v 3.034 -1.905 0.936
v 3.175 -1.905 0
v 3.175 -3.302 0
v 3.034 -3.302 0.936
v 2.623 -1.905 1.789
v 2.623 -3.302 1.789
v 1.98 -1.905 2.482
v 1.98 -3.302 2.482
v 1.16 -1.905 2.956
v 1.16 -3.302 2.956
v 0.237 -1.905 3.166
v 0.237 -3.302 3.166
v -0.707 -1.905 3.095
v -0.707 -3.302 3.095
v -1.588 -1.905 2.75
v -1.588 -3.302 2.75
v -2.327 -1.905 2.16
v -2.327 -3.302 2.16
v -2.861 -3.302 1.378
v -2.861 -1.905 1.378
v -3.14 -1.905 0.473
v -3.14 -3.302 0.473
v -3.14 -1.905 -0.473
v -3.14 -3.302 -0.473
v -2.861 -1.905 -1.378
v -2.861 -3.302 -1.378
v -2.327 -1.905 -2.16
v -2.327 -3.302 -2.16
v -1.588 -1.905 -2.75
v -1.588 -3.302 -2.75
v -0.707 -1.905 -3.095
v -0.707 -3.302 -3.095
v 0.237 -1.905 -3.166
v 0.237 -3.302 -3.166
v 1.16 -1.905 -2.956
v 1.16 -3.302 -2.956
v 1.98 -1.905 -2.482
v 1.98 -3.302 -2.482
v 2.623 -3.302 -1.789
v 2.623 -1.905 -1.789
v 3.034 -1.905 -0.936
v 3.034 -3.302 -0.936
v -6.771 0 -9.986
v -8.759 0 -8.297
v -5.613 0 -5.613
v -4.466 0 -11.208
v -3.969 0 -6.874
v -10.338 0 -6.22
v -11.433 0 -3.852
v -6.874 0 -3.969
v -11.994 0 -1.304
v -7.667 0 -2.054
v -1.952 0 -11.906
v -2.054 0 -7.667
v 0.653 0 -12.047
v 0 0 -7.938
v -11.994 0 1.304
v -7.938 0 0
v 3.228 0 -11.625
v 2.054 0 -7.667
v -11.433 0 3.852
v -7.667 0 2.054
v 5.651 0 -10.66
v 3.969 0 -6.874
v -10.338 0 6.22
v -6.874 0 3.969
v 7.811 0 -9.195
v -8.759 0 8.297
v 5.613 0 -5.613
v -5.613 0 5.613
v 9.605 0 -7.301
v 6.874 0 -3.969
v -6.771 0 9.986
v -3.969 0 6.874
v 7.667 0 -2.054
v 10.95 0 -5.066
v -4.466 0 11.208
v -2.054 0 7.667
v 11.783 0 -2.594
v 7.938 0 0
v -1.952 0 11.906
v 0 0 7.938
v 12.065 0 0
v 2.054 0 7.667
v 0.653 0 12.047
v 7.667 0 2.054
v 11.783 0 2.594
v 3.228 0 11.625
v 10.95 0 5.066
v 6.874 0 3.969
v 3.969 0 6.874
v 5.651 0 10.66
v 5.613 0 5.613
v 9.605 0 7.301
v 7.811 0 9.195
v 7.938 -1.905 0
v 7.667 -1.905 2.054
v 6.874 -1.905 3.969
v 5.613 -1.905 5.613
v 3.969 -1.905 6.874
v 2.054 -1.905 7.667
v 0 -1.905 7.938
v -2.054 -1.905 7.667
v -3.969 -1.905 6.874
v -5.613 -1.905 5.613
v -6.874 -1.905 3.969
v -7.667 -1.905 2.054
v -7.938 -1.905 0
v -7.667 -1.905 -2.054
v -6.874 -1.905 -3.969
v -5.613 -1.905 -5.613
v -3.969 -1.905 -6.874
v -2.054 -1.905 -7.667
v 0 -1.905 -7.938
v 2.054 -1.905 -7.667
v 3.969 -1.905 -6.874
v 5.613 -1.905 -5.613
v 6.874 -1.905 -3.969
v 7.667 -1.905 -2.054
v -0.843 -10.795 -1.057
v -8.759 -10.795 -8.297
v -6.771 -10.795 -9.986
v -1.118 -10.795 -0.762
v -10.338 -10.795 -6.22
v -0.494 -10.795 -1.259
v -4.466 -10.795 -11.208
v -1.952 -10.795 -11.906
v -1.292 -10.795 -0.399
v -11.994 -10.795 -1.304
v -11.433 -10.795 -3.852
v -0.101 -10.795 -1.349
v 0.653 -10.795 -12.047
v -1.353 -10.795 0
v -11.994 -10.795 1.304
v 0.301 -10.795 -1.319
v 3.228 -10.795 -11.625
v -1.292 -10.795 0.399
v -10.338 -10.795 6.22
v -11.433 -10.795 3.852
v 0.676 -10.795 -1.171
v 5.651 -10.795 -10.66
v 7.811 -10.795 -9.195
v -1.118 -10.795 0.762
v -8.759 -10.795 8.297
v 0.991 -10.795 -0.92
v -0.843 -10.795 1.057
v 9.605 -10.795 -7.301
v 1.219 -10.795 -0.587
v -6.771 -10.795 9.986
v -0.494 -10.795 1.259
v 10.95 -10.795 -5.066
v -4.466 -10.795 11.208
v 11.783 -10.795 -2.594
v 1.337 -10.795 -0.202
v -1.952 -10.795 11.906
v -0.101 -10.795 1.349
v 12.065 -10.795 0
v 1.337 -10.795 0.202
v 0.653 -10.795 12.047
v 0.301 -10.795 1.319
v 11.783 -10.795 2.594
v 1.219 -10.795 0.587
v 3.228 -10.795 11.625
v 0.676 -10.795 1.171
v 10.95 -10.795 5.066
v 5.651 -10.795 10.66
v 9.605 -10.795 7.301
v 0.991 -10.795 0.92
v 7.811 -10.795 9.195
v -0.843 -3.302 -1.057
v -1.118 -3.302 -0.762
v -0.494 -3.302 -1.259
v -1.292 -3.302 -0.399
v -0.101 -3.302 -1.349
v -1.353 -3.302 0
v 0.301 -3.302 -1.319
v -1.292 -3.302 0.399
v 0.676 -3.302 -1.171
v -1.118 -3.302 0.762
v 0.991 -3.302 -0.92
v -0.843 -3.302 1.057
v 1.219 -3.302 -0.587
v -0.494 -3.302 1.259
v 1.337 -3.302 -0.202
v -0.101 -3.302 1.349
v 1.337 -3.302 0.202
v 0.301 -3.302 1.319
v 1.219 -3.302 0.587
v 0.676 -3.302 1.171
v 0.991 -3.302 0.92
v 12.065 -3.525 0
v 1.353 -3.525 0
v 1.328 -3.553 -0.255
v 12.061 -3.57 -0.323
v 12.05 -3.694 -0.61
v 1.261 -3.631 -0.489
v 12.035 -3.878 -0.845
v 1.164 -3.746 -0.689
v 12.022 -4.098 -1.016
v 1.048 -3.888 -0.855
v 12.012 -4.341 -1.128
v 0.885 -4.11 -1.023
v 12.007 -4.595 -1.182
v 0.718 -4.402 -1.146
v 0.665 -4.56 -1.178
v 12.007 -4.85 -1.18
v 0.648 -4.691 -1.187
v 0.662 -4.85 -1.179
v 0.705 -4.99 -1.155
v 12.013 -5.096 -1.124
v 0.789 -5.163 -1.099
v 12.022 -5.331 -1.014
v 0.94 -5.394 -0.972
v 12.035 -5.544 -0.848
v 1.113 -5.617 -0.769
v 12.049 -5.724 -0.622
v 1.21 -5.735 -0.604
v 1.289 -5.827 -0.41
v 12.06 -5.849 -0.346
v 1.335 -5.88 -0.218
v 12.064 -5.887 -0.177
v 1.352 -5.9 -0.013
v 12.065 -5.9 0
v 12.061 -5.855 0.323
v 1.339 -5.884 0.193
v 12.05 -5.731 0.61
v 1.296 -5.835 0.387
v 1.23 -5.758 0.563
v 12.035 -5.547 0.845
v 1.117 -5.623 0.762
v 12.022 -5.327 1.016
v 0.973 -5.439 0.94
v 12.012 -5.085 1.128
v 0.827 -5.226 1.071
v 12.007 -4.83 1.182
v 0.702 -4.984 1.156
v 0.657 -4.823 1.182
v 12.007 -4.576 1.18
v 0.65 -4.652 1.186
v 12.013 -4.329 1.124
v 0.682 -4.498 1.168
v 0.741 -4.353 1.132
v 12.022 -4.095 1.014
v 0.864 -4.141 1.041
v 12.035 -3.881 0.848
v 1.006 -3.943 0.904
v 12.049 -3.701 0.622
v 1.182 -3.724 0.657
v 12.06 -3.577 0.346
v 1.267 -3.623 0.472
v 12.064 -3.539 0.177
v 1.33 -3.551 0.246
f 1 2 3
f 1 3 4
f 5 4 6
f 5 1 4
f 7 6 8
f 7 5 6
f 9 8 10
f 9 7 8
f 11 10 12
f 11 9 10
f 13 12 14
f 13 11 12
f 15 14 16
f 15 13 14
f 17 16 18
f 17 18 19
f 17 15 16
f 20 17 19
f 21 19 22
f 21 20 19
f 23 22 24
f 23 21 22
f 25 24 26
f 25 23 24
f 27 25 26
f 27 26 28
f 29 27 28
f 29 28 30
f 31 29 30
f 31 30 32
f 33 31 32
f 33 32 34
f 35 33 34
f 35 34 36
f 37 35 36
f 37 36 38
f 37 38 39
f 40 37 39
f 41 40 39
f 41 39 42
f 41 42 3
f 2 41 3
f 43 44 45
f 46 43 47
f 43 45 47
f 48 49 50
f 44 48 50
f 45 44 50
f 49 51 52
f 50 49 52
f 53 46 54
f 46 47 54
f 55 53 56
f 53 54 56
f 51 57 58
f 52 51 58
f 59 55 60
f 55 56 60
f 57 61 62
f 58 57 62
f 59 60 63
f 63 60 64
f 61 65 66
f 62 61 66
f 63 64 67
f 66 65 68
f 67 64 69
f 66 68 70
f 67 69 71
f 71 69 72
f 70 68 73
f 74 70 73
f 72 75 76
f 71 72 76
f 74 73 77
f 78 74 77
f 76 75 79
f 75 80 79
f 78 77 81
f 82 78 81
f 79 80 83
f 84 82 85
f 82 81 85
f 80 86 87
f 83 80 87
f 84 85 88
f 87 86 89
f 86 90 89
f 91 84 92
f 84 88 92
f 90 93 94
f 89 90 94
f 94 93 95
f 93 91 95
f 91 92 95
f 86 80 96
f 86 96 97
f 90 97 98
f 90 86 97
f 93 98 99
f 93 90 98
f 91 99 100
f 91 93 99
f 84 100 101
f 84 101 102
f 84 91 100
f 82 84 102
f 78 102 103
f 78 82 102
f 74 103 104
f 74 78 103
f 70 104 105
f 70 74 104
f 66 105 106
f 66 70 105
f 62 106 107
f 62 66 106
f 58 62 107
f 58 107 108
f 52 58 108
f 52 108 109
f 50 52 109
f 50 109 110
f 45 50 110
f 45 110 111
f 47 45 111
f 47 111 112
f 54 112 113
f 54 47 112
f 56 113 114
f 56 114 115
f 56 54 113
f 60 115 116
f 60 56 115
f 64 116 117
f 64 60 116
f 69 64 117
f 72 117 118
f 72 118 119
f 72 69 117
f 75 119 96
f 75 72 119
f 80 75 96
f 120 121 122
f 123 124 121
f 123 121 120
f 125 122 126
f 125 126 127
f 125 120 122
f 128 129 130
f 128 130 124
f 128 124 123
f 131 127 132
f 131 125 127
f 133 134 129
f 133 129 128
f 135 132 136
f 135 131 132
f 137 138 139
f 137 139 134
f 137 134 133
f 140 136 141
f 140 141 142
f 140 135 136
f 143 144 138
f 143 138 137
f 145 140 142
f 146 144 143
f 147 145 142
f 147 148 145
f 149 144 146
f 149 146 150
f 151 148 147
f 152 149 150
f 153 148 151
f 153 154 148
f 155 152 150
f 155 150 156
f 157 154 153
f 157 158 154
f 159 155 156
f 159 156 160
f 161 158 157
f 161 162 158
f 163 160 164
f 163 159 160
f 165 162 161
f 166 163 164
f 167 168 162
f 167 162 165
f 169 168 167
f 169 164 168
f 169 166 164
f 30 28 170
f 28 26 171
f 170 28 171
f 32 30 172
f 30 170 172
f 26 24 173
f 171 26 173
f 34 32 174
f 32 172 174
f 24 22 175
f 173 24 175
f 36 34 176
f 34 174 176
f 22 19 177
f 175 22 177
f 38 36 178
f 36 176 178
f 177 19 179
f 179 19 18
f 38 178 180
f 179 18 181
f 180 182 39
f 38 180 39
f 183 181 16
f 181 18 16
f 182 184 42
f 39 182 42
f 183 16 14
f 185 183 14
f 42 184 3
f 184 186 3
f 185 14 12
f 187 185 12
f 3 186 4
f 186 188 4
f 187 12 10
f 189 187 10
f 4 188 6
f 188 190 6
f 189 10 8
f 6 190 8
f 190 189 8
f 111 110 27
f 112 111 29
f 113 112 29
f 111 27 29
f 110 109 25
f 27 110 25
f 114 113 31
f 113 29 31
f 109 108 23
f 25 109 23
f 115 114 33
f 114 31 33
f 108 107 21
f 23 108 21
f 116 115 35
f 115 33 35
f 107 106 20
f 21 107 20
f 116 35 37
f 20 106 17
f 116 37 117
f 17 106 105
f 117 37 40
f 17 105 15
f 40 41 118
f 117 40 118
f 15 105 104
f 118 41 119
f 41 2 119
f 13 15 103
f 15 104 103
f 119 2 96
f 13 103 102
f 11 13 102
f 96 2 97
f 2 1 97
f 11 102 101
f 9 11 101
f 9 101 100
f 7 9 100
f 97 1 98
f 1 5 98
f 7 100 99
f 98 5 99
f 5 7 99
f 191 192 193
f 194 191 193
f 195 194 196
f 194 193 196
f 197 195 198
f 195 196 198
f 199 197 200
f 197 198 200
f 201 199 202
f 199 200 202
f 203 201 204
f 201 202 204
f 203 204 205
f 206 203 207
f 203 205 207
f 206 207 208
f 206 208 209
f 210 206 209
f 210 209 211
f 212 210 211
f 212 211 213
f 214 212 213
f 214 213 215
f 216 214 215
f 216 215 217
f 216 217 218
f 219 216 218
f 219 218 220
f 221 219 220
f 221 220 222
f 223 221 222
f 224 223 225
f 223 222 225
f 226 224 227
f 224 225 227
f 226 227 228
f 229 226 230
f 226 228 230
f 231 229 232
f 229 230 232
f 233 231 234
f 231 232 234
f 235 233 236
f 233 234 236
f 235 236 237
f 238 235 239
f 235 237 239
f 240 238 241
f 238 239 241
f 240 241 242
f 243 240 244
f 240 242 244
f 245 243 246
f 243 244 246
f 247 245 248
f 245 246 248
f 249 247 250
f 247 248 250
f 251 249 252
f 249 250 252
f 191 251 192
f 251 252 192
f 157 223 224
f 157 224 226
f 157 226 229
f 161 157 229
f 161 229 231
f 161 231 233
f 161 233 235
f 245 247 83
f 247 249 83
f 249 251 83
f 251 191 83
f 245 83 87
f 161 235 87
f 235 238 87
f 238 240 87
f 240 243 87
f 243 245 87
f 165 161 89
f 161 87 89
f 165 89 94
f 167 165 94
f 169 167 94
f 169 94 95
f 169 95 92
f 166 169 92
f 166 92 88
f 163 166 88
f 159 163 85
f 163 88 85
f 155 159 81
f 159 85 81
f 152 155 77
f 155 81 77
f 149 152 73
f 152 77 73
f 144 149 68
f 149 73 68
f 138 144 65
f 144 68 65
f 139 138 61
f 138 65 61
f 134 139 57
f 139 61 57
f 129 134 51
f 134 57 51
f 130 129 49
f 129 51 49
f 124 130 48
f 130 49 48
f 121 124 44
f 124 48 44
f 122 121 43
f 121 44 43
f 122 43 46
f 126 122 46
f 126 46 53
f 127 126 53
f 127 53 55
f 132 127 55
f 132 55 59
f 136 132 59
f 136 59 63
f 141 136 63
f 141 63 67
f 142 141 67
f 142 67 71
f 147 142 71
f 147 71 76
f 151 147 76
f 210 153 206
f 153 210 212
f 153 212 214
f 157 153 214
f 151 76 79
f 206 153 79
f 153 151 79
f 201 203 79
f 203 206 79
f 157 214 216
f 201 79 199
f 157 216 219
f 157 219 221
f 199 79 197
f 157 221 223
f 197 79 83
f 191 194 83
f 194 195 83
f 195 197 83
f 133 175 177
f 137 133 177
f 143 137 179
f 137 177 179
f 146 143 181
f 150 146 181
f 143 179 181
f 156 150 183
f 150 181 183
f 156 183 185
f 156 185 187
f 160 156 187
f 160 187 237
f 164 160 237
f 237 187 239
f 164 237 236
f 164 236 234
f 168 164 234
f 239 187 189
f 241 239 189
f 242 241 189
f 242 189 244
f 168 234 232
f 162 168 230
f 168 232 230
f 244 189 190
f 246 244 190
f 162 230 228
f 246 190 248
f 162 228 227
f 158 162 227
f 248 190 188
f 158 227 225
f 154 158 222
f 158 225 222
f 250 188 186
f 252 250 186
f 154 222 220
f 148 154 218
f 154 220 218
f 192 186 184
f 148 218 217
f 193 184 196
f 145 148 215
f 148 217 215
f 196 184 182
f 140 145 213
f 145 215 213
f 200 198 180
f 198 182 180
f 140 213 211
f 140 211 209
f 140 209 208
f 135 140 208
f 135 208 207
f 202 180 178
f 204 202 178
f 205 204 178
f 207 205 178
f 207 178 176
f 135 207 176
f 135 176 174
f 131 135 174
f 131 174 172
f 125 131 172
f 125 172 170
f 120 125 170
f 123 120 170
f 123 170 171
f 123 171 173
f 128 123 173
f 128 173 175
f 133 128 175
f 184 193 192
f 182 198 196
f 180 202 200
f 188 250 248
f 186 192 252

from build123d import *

# Parameters (mm, degrees)
F0_R     = 12.065
F1_DEPTH = 10.795
F2_R     = 7.9375
F3_DEPTH = 1.905
F4_R     = 3.175
F5_DEPTH = 3.302
F7_D     = 2.7051
F9_D     = 2.3749
F9_DEPTH = 12.066


with BuildPart() as f1:
    # F0 (on Front) → F1 (new body)
    with BuildSketch(Plane.XZ):
        Circle(F0_R)
    extrude(amount=F1_DEPTH)

    # F2 (on face) → F3 (cut)
    with BuildSketch(Plane.XZ):
        Circle(F2_R)
    extrude(amount=F3_DEPTH, mode=Mode.SUBTRACT)

    # F4 (on face) → F5 (cut)
    with BuildSketch(Plane.XZ):
        Circle(F4_R)
    extrude(amount=F5_DEPTH, mode=Mode.SUBTRACT)

    # F7 (through all)
    with Locations(Plane.XZ.offset(10.795)):
        with Locations((0, 0)):
            Hole(F7_D / 2)

    # F9 (through all, one way)
    with BuildSketch(Plane(origin=(0, 0, 0), x_dir=(0, 1, 0), z_dir=(-1, 0, 0))):
        with Locations((-4.7127064317, 0)):
            Circle(F9_D / 2)
    extrude(amount=-F9_DEPTH, mode=Mode.SUBTRACT)


solid = f1.part
